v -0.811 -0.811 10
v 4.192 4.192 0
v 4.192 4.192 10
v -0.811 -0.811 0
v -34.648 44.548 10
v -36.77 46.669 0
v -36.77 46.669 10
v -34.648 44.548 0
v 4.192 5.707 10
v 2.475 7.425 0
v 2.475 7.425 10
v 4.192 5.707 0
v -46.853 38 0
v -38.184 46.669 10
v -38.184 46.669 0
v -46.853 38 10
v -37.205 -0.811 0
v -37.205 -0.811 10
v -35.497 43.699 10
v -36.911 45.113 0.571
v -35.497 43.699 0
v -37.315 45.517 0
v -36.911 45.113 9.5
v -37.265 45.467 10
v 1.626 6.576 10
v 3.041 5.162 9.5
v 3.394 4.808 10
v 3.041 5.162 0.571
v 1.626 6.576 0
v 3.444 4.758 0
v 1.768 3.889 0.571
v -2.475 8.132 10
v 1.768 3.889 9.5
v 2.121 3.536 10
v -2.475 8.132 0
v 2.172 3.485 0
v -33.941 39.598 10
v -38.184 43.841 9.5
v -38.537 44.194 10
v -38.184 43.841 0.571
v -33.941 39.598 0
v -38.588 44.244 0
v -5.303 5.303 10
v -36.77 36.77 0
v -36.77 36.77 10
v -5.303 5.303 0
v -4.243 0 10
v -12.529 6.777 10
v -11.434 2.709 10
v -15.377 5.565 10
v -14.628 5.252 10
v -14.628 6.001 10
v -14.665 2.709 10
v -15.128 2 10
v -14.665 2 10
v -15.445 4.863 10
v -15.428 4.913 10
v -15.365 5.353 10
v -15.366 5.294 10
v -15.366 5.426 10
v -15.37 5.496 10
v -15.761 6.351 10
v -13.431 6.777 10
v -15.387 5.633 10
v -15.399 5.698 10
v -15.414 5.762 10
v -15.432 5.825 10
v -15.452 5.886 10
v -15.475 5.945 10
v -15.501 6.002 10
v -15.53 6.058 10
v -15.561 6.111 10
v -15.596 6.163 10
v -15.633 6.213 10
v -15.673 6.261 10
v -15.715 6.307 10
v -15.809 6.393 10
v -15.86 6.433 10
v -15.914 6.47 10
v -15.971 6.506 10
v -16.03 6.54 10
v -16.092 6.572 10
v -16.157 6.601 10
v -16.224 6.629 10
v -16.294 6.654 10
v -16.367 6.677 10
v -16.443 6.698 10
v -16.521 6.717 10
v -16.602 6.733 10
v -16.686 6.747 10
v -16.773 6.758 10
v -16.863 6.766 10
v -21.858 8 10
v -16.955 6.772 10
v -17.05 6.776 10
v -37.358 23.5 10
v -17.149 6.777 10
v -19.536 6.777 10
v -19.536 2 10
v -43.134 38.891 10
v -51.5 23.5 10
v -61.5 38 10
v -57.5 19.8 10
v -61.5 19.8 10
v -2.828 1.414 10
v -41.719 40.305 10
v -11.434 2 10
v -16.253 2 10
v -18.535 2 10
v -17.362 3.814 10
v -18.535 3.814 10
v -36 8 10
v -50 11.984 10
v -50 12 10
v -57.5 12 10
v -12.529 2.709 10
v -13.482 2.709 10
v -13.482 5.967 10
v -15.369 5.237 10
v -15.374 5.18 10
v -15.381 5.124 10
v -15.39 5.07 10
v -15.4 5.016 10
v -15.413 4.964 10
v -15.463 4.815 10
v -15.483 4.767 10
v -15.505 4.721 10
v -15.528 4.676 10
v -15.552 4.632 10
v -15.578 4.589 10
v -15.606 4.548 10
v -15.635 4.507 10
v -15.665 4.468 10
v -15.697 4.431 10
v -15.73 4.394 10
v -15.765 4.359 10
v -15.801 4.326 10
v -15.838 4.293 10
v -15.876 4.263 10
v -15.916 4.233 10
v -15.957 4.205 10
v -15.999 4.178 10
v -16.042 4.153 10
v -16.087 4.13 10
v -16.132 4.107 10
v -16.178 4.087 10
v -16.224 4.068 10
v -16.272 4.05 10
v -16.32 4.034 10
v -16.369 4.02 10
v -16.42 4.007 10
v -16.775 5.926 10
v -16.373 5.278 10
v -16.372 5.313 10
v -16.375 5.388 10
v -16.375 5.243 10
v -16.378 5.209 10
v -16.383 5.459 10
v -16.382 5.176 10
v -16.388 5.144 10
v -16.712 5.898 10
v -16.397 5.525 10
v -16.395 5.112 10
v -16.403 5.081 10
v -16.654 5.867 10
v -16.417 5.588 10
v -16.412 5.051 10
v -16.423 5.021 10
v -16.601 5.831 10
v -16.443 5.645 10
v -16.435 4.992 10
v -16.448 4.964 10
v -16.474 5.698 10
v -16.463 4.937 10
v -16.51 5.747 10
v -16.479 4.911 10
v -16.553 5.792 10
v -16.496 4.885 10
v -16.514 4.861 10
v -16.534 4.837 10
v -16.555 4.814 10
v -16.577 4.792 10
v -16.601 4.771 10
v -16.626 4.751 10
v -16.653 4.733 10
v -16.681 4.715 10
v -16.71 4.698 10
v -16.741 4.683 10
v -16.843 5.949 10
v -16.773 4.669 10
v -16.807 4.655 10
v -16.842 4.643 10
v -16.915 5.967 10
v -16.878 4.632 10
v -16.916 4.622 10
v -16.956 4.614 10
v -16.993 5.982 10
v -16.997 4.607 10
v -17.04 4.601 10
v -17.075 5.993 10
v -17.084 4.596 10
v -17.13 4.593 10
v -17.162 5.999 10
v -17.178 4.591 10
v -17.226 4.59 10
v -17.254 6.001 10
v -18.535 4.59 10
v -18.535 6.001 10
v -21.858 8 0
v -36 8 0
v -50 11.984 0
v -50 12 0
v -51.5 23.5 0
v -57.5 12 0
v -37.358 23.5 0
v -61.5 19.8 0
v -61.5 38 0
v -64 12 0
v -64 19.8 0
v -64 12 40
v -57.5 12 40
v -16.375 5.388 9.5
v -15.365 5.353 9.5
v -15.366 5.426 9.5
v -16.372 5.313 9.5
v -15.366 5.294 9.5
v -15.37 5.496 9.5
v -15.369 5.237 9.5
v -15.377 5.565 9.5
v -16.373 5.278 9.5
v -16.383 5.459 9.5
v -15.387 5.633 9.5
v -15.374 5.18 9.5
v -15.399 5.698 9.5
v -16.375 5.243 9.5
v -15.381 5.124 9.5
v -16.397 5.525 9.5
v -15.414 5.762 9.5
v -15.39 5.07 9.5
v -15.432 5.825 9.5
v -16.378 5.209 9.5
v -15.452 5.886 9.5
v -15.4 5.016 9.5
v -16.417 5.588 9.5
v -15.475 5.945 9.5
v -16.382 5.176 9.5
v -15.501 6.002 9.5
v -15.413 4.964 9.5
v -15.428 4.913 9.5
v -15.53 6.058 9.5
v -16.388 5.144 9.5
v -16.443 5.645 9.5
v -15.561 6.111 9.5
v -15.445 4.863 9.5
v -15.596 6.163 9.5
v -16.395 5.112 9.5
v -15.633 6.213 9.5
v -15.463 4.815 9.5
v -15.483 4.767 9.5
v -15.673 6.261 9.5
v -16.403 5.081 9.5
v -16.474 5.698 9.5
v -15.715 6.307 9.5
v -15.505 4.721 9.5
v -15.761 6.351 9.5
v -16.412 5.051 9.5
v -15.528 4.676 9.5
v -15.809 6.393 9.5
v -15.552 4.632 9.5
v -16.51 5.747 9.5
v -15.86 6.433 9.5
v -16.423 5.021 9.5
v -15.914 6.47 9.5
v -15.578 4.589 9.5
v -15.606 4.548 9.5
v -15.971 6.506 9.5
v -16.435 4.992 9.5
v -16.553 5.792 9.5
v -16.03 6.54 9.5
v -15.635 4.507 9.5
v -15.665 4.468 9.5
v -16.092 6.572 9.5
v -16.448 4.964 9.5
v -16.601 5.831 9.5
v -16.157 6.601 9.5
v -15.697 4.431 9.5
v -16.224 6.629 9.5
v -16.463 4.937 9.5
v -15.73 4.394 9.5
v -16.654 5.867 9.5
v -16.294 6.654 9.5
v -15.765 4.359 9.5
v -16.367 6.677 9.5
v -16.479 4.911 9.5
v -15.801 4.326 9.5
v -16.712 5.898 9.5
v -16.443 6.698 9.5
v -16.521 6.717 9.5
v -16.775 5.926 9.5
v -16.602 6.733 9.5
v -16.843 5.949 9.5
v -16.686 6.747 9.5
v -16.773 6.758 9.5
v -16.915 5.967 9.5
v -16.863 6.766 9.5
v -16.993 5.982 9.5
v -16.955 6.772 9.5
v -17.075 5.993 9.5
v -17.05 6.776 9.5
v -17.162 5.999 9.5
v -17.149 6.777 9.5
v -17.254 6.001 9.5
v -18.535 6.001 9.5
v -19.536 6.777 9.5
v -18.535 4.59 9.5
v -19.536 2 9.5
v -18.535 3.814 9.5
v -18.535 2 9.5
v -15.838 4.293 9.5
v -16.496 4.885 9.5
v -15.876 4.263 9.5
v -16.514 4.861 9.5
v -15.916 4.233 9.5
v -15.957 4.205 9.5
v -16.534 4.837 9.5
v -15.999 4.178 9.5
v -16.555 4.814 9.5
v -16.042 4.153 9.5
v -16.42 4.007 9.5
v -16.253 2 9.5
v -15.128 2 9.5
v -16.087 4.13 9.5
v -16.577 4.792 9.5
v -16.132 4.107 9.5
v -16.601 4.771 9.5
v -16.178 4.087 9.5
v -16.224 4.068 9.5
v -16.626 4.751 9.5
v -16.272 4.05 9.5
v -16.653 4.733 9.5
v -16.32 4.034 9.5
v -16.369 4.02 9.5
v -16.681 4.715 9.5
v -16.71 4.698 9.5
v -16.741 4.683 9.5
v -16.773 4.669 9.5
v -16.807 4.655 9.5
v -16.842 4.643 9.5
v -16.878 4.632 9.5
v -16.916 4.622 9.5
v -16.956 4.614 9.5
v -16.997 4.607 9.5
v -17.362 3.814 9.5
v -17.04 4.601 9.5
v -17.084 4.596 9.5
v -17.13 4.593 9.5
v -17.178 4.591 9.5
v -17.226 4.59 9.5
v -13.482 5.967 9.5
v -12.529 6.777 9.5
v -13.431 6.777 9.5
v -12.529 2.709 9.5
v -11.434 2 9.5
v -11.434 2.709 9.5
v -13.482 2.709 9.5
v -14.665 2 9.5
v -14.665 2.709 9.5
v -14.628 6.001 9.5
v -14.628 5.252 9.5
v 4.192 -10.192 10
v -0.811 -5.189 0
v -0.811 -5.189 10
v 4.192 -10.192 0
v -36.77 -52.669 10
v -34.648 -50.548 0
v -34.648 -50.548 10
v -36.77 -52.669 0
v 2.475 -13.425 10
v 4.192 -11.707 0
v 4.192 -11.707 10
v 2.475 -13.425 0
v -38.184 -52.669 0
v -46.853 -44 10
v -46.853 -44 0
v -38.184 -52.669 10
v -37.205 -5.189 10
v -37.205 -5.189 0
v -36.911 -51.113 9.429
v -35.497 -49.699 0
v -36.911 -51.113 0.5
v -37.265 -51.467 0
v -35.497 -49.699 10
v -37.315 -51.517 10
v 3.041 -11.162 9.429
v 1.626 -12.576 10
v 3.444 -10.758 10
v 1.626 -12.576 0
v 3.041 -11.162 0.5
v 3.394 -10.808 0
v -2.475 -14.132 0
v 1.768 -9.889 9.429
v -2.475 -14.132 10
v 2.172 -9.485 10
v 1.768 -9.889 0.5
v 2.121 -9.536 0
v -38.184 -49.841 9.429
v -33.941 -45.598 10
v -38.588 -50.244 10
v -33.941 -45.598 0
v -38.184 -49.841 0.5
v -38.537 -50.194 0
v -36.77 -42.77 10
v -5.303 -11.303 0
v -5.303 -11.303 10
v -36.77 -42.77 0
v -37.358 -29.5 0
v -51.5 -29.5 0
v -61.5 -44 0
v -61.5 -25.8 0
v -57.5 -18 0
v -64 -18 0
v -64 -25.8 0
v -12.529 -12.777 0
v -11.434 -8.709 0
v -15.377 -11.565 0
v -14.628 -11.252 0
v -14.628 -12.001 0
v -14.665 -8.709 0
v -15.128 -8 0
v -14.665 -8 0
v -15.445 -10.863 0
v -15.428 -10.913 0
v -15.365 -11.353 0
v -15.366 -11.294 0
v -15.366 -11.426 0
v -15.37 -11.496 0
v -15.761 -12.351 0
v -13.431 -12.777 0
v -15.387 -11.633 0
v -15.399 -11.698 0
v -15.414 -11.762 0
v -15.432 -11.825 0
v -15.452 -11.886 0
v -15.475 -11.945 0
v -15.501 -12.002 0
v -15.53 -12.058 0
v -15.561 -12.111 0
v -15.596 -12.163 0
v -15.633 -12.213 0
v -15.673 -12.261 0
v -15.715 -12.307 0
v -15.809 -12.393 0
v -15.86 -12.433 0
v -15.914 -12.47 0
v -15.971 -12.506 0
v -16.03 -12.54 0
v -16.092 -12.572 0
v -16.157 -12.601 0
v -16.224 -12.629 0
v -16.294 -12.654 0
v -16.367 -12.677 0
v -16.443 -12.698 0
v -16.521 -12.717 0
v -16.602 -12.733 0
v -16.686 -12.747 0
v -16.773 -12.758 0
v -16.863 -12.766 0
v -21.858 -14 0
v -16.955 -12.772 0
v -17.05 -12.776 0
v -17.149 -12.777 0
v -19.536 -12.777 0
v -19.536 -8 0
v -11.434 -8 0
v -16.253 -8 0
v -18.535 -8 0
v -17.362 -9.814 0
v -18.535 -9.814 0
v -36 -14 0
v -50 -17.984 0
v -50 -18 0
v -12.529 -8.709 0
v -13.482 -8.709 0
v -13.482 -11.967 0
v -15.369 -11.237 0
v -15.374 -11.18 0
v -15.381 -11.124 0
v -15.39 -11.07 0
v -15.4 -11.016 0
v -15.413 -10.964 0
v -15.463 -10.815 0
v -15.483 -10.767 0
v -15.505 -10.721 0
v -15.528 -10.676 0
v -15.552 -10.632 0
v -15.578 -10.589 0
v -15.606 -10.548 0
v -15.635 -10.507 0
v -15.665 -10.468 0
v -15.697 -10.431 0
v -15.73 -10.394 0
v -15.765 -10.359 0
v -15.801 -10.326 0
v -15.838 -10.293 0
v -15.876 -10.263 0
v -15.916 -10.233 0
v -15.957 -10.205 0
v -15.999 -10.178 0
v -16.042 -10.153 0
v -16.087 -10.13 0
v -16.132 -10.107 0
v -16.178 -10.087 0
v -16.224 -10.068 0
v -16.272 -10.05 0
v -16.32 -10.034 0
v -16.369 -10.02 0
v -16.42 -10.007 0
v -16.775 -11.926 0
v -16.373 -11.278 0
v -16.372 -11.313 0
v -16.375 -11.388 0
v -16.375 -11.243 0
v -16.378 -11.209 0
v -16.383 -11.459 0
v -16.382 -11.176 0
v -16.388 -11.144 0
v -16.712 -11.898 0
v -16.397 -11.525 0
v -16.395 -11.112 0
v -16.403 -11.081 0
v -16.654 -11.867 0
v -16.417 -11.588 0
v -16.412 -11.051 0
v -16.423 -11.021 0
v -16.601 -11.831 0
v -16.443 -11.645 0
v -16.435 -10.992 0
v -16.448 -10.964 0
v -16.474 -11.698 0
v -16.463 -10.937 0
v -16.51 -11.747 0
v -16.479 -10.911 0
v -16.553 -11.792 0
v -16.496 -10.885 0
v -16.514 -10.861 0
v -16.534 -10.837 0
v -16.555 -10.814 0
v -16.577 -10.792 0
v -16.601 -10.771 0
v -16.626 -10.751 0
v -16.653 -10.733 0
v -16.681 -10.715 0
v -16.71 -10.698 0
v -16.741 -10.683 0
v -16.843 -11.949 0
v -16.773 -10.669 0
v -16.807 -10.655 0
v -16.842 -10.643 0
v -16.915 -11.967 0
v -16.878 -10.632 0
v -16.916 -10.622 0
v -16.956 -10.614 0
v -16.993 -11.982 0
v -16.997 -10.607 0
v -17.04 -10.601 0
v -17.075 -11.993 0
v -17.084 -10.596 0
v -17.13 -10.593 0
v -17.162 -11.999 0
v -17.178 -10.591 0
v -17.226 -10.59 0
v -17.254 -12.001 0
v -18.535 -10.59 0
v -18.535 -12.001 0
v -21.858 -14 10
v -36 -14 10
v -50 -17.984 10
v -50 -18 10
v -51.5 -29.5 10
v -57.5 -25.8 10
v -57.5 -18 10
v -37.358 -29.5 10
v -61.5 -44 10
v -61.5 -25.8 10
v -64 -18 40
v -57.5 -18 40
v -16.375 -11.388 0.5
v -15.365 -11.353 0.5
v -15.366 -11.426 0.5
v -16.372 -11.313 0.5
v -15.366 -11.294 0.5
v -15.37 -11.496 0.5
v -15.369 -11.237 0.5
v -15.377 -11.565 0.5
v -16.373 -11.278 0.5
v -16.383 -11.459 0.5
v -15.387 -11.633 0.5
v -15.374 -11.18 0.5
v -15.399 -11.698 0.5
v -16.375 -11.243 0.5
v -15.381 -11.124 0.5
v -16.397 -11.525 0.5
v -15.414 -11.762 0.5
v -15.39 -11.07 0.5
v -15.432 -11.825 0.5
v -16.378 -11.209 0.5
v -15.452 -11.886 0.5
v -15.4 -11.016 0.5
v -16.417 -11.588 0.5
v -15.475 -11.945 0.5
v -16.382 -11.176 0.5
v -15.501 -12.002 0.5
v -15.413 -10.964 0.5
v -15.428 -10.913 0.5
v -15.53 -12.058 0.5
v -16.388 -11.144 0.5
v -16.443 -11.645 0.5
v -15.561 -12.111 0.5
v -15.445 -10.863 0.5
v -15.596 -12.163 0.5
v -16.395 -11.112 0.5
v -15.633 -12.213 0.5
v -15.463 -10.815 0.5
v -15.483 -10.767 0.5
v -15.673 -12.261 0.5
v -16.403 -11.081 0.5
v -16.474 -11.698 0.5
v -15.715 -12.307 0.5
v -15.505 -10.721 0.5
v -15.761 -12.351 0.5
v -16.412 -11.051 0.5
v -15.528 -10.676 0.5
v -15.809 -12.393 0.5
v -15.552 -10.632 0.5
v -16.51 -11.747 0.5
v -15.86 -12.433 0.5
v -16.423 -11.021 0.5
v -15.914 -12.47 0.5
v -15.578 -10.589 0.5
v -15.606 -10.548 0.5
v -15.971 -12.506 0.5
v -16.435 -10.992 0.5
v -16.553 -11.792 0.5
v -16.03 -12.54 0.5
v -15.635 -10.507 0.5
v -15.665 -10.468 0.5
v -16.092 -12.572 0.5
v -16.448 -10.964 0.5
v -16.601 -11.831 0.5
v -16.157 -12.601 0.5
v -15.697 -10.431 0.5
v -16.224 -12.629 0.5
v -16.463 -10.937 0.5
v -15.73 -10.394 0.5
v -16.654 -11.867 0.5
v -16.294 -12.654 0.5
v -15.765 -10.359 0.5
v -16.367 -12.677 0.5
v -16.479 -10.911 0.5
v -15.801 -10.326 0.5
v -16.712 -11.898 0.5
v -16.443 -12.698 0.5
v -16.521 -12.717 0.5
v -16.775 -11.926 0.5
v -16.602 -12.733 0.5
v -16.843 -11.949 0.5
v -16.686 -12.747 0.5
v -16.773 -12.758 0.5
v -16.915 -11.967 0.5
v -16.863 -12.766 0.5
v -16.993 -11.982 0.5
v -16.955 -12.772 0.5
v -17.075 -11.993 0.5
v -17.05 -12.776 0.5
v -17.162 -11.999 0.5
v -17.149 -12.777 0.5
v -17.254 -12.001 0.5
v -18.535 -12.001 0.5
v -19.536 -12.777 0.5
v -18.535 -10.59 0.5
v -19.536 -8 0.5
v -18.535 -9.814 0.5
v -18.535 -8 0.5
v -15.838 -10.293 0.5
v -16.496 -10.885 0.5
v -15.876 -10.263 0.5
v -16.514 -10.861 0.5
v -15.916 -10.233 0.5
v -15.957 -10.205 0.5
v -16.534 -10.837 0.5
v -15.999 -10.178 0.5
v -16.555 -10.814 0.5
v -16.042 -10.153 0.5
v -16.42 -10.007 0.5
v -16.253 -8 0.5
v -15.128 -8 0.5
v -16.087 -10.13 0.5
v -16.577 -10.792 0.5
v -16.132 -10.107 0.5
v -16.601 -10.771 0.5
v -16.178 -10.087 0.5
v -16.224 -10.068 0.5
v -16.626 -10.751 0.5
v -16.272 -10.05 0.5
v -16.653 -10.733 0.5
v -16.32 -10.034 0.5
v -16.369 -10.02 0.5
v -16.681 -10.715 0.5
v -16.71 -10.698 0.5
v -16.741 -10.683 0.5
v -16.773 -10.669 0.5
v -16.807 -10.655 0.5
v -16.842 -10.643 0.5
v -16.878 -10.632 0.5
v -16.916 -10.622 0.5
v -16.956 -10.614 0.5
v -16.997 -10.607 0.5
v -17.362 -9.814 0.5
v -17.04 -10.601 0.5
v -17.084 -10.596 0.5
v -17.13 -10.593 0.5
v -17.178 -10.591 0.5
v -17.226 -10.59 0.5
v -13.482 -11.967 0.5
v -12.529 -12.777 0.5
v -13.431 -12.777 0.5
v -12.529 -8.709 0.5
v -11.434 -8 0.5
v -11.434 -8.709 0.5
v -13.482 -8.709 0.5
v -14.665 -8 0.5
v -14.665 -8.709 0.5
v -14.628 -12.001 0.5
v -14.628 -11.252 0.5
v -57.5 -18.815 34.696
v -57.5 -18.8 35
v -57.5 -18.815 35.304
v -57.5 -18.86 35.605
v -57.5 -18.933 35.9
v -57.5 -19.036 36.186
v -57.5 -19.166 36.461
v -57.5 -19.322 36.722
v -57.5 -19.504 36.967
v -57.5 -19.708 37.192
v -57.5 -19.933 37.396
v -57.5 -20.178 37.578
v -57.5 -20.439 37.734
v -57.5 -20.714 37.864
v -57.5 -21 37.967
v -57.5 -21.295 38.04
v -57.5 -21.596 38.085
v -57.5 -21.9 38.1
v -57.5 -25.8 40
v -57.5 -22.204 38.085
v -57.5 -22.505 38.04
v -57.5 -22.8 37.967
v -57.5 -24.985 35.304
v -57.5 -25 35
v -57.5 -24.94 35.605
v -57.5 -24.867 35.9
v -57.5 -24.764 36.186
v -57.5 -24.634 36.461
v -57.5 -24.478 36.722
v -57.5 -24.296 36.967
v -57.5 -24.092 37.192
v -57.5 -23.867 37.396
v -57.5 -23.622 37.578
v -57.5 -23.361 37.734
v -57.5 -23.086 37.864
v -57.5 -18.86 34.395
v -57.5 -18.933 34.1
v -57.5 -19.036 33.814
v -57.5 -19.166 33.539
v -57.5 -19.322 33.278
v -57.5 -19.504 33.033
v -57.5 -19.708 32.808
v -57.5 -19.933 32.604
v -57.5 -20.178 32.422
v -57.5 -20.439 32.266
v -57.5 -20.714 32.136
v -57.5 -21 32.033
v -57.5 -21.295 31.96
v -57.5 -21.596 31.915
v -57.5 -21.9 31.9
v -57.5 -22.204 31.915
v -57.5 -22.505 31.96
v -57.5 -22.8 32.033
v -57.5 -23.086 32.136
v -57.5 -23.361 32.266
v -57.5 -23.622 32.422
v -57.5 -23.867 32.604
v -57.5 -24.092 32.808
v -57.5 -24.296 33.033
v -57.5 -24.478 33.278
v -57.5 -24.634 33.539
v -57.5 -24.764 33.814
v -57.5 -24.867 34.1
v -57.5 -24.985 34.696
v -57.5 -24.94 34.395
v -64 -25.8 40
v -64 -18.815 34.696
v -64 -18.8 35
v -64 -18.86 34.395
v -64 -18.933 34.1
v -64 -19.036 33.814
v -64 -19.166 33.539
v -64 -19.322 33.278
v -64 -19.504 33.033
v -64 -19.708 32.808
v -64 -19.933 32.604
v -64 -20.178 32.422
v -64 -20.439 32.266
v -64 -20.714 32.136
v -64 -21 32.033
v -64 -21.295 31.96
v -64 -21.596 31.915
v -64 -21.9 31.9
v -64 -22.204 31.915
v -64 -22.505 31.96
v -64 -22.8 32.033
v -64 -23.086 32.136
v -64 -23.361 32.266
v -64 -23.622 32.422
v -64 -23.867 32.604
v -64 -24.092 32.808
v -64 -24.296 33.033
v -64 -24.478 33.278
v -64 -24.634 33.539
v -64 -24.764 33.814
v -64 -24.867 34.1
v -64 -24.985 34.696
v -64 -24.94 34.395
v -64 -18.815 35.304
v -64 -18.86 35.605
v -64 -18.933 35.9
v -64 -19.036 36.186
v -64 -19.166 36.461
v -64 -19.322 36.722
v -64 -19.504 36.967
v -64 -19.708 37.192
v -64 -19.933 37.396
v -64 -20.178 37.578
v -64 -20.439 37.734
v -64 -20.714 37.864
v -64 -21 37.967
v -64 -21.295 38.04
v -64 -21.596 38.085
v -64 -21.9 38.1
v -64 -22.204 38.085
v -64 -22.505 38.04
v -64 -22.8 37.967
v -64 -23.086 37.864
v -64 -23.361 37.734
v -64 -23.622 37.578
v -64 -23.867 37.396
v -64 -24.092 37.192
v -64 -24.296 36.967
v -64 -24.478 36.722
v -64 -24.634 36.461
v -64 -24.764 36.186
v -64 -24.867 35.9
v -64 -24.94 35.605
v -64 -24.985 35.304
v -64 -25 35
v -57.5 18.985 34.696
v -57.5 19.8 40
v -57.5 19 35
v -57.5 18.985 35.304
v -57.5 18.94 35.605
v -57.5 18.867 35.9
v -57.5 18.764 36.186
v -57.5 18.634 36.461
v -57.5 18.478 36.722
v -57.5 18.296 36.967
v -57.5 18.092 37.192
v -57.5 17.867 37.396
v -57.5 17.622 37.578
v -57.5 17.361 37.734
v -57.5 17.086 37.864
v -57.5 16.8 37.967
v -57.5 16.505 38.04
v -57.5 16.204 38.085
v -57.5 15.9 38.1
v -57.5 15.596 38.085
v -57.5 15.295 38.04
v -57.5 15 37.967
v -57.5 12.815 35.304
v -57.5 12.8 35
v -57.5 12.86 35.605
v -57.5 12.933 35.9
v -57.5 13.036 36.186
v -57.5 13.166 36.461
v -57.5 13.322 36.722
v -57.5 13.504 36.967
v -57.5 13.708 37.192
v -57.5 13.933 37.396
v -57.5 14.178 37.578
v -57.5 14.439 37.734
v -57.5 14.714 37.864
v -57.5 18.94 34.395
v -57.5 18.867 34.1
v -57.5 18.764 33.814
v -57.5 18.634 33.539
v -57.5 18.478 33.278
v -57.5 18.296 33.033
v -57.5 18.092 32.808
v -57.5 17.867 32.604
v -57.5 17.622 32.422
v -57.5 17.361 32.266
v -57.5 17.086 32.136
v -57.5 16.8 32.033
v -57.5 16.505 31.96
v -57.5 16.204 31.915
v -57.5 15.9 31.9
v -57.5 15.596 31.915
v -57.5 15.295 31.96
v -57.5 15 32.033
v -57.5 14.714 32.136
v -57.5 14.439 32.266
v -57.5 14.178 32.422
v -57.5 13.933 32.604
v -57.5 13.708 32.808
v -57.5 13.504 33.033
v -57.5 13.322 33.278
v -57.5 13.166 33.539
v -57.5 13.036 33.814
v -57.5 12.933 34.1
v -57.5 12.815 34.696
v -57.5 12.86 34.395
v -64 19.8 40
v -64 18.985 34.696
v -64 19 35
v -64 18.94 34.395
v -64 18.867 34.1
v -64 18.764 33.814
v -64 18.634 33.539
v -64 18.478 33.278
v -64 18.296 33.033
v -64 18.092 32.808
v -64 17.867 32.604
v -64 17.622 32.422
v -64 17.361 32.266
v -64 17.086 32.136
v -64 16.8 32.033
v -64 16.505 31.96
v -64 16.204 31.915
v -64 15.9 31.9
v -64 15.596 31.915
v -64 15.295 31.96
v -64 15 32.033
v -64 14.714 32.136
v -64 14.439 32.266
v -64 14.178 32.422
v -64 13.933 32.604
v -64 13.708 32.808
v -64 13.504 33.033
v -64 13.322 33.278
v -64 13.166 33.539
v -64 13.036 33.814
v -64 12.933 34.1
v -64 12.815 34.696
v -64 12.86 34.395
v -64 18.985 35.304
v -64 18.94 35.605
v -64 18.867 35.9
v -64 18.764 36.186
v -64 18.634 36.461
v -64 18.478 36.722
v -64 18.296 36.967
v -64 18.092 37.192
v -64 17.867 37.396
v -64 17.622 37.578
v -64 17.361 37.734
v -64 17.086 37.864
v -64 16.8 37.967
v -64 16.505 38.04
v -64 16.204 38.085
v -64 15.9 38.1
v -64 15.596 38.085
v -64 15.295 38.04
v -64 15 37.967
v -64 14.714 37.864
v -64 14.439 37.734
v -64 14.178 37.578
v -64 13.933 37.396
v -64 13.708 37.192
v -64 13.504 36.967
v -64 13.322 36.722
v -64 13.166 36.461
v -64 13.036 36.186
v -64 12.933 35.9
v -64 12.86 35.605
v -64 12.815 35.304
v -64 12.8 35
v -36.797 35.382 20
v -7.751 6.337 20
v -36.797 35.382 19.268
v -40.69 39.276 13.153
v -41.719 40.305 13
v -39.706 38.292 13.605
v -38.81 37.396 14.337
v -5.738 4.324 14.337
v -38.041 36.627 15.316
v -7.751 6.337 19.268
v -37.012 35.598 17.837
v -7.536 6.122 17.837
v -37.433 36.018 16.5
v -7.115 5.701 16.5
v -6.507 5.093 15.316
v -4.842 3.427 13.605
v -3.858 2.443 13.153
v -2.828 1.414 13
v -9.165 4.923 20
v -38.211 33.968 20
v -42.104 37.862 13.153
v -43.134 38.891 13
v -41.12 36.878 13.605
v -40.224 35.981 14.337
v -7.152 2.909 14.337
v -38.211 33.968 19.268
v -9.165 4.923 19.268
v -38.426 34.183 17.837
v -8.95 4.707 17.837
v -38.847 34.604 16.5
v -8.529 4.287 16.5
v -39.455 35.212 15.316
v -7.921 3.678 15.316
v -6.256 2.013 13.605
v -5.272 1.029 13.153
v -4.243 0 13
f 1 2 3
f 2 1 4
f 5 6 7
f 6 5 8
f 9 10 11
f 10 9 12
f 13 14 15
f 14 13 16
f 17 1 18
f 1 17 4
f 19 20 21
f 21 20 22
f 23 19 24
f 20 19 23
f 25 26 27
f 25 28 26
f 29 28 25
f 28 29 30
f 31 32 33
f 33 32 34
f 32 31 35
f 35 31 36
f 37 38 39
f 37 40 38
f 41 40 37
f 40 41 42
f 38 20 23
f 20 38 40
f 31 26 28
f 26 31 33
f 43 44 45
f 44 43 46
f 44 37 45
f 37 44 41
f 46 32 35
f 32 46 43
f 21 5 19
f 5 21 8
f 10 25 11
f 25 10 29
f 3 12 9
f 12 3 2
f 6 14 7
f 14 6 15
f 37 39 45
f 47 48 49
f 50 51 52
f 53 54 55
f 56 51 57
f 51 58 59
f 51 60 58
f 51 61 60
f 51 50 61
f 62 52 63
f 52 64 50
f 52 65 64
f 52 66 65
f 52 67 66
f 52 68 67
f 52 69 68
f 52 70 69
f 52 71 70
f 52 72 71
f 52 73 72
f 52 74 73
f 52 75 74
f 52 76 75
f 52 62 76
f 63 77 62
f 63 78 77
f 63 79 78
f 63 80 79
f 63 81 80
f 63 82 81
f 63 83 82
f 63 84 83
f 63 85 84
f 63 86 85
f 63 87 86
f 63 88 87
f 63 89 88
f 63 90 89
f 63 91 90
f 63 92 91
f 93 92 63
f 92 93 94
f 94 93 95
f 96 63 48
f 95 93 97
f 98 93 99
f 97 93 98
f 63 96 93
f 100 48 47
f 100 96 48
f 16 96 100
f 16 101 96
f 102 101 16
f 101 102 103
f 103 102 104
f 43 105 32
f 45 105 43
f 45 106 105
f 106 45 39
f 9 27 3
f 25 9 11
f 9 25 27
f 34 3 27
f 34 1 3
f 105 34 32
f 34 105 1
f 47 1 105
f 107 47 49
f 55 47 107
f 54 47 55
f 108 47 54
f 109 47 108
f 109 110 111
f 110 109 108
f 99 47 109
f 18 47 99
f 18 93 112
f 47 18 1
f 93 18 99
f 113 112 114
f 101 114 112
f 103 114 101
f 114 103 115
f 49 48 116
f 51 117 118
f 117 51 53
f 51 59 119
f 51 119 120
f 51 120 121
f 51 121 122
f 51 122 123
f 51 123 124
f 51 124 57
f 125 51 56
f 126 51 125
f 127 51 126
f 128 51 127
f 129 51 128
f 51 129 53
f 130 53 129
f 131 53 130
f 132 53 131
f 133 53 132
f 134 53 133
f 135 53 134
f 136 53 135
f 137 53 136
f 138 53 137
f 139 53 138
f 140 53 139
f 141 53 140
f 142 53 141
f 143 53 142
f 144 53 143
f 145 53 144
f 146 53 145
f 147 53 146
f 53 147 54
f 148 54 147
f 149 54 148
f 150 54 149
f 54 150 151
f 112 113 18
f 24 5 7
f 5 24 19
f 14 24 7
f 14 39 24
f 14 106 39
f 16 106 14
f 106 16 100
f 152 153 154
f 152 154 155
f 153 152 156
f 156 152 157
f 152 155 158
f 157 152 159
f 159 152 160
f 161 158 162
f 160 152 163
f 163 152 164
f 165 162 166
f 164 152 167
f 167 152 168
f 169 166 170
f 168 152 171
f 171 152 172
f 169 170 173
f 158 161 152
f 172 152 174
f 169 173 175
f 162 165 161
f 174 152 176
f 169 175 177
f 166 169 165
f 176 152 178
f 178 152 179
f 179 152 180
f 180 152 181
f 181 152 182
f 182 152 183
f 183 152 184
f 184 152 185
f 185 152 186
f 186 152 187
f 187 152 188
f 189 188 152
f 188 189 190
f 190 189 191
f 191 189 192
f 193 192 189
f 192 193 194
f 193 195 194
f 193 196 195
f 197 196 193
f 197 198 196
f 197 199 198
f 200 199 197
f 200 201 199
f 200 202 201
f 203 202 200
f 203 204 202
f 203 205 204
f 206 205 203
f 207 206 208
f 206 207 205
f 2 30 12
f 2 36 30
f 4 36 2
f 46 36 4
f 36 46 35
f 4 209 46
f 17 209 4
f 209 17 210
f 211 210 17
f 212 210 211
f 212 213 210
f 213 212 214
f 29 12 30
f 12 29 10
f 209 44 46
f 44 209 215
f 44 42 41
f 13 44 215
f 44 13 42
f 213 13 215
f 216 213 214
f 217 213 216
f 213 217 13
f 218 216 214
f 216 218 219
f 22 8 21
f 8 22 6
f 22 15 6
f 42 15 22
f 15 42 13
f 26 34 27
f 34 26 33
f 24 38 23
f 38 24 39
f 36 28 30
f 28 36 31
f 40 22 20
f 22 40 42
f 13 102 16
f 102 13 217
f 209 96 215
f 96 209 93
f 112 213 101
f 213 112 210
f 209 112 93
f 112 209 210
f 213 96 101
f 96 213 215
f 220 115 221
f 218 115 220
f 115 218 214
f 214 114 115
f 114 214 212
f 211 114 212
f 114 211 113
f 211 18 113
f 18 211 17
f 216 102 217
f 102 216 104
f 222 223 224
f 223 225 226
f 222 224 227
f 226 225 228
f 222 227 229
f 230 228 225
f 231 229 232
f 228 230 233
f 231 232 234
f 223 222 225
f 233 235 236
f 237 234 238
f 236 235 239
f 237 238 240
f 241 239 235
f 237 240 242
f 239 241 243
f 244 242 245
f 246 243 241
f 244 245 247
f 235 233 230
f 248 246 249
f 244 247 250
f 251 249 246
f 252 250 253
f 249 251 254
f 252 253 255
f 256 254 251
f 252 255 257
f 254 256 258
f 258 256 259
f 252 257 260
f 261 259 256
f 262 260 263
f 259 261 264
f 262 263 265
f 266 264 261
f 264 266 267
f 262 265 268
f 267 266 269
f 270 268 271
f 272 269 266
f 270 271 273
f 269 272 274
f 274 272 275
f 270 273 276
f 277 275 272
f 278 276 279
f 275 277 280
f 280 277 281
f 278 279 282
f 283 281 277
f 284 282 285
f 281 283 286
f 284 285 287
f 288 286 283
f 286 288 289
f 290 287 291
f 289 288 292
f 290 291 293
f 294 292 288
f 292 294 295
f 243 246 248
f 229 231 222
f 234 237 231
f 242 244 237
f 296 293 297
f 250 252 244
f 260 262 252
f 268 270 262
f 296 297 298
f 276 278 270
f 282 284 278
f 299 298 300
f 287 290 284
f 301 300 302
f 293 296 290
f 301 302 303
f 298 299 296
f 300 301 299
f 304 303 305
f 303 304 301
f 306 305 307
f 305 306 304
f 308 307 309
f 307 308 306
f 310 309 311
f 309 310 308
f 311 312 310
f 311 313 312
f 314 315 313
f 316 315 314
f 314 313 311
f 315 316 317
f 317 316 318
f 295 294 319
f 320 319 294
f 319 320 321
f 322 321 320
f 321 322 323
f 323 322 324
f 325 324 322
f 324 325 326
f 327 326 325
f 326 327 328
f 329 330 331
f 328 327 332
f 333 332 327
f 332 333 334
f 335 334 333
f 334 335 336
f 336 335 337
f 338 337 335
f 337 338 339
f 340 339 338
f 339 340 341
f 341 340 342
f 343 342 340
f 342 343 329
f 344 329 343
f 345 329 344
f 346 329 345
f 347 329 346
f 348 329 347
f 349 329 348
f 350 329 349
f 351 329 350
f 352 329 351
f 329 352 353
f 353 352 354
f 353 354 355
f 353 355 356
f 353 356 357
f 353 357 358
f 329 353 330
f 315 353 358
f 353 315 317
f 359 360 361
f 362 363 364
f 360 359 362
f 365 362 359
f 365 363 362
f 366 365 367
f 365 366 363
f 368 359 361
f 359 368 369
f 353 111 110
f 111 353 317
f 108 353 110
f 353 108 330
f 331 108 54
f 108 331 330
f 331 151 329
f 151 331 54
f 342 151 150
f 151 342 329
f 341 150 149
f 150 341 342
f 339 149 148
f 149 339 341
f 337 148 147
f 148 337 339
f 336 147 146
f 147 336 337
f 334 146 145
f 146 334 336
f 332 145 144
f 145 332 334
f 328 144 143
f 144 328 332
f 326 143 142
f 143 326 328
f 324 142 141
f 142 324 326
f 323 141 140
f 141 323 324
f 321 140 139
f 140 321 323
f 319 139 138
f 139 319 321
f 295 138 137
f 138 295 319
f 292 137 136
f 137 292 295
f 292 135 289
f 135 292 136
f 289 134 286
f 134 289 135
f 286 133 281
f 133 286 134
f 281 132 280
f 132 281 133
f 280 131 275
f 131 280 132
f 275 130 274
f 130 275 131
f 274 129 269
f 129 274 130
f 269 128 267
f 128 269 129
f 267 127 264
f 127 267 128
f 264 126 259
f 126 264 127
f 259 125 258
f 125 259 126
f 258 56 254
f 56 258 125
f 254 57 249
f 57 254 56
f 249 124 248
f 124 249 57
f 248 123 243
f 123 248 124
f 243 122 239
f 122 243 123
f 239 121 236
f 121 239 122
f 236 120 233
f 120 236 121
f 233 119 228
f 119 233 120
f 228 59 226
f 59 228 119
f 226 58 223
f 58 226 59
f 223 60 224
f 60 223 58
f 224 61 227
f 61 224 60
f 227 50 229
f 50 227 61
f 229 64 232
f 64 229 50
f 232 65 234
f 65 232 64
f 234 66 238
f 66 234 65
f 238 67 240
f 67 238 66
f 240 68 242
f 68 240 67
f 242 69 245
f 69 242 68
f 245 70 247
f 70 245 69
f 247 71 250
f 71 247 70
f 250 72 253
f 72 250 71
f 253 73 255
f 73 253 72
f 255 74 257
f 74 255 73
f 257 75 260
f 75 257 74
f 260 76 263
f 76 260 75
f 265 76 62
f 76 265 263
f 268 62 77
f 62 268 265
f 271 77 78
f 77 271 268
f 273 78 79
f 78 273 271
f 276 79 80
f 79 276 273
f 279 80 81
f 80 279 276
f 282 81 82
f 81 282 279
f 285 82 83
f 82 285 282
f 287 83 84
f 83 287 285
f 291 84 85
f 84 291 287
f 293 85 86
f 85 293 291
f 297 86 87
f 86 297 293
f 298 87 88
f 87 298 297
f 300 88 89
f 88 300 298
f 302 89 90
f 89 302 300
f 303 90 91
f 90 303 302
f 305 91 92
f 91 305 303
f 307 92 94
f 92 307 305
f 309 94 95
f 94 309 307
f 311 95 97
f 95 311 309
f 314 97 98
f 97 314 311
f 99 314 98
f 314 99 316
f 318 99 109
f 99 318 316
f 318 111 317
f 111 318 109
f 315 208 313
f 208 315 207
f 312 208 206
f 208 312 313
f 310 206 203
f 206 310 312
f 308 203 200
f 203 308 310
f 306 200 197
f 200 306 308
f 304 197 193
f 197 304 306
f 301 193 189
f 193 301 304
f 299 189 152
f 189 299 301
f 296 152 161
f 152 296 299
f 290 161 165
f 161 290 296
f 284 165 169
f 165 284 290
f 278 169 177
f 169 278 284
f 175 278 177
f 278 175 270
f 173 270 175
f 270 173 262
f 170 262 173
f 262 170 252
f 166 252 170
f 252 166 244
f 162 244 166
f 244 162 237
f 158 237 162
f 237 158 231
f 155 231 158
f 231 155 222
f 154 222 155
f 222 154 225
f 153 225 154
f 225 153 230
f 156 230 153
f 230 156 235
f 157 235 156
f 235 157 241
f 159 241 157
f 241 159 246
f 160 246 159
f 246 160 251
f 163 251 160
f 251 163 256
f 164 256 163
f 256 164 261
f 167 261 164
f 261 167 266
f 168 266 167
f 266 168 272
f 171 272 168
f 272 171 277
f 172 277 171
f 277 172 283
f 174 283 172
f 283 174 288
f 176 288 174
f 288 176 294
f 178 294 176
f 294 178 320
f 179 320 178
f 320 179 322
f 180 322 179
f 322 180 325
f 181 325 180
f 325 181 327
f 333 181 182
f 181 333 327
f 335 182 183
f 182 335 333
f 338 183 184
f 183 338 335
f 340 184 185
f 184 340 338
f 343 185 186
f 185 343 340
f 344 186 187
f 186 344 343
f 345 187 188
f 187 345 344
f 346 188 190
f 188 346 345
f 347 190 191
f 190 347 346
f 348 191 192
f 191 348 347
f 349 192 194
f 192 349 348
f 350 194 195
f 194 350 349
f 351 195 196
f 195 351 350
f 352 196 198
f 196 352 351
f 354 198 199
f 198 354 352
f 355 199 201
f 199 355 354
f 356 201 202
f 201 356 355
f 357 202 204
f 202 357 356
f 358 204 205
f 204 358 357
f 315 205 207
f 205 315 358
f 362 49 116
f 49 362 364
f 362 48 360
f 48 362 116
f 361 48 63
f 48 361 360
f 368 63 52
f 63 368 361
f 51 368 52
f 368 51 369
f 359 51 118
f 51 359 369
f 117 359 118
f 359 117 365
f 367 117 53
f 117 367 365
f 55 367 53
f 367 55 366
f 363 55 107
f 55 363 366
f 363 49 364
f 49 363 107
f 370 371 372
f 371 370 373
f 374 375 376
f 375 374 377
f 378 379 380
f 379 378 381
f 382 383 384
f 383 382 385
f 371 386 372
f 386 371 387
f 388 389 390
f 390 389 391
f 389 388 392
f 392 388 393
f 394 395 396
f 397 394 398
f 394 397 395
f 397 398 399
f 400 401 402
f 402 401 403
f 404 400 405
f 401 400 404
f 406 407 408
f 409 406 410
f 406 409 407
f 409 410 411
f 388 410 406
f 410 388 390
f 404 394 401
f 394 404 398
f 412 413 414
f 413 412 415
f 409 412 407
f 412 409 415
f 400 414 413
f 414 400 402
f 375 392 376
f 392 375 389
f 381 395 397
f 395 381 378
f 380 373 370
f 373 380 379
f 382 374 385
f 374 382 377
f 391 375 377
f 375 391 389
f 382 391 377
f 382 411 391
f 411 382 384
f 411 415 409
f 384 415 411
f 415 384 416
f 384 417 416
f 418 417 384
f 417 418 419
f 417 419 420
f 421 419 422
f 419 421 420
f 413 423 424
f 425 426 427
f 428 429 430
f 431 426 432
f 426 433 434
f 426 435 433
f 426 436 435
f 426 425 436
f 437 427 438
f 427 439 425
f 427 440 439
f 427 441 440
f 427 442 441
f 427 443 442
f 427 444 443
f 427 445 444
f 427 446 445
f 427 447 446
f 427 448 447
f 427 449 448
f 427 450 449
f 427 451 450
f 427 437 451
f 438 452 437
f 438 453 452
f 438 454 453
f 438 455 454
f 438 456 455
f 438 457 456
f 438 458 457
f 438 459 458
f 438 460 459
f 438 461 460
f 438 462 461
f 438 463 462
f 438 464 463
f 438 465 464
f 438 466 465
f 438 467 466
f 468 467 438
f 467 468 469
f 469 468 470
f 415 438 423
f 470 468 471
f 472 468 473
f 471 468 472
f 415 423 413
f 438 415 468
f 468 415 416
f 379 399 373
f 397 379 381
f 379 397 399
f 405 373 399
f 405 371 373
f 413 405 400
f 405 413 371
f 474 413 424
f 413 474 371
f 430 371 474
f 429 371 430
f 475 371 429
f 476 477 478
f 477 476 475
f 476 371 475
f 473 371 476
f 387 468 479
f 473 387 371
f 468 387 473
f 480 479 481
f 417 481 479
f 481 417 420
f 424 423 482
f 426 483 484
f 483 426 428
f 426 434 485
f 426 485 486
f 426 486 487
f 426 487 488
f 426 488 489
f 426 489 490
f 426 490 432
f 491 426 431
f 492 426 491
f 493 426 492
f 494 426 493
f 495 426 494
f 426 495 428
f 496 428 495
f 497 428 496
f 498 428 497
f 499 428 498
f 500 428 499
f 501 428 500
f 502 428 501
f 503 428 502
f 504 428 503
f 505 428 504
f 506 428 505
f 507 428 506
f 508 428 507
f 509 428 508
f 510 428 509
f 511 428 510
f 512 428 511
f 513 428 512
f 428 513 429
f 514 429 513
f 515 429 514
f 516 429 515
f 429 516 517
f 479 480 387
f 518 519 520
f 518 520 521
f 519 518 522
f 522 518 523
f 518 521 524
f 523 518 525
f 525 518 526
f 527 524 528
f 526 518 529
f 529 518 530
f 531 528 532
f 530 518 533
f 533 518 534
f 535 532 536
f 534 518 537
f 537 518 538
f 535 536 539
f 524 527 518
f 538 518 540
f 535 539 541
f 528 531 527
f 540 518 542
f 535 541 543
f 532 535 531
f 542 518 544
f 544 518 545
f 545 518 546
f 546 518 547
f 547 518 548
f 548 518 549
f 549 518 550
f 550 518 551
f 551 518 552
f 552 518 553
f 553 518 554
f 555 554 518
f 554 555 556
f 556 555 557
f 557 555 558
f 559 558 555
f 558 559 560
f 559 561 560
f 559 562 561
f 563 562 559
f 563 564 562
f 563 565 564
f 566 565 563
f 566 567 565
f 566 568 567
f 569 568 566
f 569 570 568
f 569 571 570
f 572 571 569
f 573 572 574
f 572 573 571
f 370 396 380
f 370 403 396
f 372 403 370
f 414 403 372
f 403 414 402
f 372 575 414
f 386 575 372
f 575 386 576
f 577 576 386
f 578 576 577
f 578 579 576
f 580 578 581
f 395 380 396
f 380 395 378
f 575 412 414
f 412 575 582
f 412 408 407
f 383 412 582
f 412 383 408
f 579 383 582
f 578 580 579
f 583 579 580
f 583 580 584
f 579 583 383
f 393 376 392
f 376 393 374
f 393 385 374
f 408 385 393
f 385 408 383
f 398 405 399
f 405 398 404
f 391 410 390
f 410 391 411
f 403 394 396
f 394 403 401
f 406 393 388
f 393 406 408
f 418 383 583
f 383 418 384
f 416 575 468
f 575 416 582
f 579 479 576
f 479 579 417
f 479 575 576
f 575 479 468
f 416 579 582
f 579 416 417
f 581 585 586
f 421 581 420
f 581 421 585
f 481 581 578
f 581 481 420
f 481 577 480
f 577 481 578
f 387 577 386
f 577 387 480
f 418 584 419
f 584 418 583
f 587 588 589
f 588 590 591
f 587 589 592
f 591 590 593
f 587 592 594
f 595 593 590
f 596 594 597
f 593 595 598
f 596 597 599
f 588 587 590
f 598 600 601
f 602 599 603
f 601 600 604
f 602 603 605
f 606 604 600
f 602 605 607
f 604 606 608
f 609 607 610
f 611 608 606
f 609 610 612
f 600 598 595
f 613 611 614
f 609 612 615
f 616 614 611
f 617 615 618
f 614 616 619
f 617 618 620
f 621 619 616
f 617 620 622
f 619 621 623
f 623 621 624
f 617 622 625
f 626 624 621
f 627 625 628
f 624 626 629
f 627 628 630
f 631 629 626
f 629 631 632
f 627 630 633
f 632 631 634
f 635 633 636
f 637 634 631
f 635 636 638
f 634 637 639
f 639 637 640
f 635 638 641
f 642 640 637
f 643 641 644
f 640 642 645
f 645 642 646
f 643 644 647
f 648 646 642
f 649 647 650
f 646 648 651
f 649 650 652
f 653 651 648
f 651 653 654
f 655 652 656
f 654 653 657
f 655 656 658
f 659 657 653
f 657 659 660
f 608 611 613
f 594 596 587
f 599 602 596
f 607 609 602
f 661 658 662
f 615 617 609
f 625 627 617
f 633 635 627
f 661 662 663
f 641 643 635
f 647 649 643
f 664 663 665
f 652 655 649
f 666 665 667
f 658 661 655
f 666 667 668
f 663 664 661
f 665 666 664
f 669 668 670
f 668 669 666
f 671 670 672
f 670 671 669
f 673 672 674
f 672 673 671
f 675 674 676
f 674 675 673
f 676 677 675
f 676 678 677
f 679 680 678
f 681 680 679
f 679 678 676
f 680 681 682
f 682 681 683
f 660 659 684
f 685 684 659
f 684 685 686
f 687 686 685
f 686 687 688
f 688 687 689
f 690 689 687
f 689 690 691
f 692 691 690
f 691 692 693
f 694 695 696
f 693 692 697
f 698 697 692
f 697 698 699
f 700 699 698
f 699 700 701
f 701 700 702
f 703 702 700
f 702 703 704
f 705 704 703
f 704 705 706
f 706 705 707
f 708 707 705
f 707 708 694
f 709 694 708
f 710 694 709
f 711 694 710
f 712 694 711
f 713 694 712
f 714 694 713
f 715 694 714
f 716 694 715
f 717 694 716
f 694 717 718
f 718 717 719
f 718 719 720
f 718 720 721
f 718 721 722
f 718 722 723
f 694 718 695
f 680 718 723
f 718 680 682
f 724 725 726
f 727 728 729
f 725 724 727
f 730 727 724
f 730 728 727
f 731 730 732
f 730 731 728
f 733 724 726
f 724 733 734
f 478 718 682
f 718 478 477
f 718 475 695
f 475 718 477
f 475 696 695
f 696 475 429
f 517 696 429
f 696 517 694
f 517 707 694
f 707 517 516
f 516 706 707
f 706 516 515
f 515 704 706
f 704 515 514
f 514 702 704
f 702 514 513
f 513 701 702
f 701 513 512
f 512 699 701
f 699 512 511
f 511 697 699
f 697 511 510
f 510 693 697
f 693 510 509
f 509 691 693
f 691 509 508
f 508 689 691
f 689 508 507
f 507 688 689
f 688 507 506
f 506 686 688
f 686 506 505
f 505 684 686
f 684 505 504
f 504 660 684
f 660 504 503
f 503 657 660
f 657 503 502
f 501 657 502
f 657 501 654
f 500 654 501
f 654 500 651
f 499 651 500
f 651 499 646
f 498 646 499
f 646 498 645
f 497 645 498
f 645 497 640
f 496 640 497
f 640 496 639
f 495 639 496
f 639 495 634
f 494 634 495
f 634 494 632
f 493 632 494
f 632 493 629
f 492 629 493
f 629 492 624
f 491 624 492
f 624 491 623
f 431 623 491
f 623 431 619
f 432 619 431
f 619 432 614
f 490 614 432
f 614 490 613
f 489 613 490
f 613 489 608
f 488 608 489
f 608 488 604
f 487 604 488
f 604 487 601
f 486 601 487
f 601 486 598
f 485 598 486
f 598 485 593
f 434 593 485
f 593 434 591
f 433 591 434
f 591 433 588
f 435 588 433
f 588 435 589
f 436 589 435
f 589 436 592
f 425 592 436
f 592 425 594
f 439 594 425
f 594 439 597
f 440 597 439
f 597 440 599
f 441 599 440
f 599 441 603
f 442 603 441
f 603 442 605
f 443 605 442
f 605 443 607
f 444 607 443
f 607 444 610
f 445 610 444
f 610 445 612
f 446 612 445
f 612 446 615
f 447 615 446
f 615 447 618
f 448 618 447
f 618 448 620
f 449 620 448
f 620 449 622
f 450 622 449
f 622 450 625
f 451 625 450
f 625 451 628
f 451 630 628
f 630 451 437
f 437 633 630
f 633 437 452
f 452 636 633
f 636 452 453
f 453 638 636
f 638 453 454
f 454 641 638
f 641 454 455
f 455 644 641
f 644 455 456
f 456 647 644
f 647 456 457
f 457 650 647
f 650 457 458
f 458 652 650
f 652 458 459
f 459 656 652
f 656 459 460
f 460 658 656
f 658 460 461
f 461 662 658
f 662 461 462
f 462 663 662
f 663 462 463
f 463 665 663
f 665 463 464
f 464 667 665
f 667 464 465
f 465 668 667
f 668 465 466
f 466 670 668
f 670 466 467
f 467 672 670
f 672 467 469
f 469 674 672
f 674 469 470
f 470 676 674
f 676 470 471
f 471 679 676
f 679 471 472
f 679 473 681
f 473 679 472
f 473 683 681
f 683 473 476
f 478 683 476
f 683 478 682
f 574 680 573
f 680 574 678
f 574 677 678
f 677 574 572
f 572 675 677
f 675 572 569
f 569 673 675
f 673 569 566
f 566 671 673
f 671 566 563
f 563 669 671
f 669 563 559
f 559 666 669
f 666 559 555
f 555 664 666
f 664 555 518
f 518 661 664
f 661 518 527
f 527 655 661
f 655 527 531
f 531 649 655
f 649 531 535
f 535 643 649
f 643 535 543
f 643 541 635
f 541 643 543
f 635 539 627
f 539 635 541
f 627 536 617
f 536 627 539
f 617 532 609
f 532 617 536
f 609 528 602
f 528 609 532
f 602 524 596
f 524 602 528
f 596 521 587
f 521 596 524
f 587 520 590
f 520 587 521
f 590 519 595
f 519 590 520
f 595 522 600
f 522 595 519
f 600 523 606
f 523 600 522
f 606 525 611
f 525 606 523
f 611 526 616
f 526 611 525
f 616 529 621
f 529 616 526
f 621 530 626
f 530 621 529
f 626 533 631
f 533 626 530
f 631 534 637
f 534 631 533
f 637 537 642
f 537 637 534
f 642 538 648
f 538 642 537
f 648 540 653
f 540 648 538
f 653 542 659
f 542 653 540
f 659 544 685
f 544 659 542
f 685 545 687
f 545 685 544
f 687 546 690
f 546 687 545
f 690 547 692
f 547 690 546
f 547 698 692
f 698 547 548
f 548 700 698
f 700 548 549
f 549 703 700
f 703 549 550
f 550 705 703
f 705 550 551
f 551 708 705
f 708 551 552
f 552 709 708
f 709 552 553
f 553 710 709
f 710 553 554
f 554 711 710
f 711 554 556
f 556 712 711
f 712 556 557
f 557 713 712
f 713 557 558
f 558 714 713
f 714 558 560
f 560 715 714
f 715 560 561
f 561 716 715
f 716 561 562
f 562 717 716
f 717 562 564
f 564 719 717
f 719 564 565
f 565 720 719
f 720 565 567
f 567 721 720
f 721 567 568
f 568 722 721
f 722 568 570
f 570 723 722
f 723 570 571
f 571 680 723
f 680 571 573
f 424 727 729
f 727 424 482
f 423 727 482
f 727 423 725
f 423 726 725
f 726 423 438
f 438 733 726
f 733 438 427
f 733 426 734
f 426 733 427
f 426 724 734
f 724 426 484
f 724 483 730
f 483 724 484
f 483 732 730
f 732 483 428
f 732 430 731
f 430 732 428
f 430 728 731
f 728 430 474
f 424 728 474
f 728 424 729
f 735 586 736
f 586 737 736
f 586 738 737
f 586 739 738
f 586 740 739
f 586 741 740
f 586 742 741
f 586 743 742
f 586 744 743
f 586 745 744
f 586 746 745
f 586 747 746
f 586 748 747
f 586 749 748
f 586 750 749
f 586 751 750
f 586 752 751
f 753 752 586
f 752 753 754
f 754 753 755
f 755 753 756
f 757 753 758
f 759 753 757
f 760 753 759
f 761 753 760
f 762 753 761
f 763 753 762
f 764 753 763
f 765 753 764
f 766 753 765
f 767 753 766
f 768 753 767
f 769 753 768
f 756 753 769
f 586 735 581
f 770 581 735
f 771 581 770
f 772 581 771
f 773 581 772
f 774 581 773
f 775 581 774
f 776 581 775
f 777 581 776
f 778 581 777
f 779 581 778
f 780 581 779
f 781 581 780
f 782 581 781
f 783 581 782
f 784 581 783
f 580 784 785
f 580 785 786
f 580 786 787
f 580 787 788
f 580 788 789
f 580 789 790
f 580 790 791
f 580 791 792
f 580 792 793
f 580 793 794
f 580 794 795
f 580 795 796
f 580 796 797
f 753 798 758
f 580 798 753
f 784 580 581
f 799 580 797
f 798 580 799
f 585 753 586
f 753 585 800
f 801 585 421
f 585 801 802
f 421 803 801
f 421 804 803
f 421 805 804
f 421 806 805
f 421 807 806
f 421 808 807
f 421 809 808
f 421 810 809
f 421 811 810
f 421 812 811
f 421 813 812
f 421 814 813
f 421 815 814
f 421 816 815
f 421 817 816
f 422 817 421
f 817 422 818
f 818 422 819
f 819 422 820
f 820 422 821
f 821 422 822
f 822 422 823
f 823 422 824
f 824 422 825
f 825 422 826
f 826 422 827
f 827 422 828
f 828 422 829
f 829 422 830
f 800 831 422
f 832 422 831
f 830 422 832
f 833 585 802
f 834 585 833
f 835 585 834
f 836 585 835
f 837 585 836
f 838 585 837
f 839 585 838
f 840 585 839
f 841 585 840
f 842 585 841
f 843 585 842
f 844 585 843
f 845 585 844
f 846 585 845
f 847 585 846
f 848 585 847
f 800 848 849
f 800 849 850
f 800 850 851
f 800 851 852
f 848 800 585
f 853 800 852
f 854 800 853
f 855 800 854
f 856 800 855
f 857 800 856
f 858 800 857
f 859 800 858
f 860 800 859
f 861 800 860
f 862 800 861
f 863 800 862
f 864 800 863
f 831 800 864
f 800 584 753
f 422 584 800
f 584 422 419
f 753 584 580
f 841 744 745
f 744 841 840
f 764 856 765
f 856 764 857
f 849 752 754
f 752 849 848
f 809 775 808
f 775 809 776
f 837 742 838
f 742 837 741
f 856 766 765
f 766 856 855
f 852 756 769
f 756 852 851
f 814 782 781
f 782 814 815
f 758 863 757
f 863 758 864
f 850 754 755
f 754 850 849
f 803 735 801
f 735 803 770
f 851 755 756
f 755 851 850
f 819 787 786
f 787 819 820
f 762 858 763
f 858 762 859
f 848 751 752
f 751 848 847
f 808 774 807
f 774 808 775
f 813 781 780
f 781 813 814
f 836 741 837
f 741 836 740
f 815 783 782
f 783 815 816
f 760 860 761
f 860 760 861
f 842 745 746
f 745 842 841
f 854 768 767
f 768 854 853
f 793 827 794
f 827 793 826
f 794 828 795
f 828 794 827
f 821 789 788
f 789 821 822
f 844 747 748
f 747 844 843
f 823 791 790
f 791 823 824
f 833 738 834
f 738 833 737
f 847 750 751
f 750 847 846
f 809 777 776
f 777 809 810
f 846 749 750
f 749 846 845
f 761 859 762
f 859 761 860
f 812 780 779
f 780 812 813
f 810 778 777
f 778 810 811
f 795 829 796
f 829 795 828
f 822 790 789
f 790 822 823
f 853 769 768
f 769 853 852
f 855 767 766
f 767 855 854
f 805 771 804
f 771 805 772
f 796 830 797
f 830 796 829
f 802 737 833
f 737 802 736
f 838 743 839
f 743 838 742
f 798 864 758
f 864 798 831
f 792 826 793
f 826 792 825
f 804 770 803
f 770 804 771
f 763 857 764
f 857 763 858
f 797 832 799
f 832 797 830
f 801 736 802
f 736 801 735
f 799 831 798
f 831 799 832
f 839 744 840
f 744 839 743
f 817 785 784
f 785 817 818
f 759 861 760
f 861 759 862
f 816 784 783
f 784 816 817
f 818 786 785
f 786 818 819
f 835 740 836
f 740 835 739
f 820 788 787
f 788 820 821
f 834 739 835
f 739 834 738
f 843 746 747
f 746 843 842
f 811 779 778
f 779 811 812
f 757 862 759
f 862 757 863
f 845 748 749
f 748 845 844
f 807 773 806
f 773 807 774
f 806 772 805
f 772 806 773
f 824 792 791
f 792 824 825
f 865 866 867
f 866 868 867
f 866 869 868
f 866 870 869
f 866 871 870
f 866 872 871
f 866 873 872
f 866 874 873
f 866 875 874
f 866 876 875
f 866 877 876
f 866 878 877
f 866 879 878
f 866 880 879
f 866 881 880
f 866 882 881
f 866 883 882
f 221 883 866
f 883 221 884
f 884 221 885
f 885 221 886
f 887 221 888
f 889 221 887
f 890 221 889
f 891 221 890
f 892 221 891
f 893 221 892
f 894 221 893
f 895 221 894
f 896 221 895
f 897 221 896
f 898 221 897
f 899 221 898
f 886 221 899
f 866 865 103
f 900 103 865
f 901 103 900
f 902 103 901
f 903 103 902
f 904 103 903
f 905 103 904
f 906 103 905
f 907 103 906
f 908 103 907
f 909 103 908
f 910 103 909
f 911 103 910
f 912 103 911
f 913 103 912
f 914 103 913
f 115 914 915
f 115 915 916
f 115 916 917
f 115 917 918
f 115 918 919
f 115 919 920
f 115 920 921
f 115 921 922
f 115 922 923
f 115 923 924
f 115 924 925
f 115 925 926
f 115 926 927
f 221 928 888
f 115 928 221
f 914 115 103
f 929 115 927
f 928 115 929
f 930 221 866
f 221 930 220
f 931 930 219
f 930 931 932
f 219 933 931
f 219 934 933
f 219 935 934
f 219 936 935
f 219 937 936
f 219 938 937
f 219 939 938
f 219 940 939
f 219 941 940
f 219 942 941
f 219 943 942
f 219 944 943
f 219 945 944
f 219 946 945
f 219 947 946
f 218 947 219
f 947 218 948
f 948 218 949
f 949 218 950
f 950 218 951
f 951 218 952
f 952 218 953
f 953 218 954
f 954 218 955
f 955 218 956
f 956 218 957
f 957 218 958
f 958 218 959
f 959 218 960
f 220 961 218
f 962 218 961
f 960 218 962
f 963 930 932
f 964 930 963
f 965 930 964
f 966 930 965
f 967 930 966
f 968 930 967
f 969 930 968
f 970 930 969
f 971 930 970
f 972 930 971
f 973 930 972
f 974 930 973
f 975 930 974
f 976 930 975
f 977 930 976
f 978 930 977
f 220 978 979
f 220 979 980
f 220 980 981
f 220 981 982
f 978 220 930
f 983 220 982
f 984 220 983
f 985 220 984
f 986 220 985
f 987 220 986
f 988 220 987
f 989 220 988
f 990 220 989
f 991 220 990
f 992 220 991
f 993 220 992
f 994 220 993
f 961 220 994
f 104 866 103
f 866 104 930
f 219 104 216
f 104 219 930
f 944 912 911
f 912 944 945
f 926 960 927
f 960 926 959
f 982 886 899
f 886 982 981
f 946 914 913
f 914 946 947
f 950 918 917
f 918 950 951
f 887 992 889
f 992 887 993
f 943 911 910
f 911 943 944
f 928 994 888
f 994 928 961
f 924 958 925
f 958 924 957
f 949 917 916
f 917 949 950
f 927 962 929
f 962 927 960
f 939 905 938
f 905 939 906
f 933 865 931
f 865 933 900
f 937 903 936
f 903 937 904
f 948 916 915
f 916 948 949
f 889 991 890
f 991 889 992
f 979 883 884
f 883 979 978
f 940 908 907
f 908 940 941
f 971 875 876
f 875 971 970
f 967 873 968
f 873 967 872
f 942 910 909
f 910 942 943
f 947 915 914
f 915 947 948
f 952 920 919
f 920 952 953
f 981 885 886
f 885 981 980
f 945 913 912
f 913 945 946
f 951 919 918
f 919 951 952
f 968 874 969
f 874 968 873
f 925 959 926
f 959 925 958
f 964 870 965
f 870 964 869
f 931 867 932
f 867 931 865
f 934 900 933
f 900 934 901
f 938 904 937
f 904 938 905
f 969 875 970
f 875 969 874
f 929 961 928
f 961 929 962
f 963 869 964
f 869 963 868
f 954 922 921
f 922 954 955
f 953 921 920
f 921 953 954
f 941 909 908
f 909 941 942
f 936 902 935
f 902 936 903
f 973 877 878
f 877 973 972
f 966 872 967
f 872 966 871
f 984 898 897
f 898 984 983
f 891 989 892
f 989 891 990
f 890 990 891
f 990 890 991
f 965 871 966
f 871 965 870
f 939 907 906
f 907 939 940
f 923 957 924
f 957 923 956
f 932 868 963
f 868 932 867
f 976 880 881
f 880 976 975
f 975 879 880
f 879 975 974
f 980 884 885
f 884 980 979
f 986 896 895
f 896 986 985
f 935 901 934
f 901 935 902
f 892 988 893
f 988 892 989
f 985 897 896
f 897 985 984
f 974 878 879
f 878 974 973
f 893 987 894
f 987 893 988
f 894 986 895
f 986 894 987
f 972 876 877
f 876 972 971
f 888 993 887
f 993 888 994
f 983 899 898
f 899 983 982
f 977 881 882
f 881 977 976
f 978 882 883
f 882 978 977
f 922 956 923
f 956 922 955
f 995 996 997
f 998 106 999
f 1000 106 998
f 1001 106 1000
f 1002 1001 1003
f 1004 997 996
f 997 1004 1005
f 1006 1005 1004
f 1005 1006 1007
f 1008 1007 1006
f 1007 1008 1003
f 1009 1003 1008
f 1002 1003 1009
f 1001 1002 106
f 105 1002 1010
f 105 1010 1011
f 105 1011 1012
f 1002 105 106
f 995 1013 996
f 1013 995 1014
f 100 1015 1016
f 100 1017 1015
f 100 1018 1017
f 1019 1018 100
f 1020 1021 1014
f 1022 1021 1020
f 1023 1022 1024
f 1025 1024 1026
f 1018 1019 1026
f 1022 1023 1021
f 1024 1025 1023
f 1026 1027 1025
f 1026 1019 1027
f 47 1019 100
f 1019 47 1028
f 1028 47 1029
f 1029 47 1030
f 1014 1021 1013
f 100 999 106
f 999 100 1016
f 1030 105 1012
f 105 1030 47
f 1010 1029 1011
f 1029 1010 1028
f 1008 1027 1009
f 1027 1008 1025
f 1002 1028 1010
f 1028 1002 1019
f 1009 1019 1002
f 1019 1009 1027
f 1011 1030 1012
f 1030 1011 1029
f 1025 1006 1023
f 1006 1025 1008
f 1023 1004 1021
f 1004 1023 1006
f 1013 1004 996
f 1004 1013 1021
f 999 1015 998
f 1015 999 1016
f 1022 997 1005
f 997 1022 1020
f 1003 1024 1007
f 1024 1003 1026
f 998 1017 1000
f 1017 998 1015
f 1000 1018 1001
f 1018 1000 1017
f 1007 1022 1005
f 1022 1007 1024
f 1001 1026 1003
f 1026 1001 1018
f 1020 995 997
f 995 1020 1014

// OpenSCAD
// PRUSA iteration4
// lcd supports
// GNU GPL v3
// Josef Průša <iam@josefprusa.cz> and contributors
// http://www.reprap.org/wiki/Prusa_Mendel
// http://prusamendel.org

// Modified to fit 4040 profile


$fn=64;

module body()
{

    difference() 
        {
        // base block
        translate([-55,-2,0]) cube([69,81,10]); 

            union ()
            {
                // outer body shape
                translate([-69.6,32,-1]) rotate([0,0,45]) cube([60,53,15]); 
                translate([13.7,89.7,-1]) rotate([0,0,135]) cube([60,42,15]);
                translate([-19,-9,-1]) cube([60,9,15] );   
                translate([7,-3,-1]) cube([60,68,16]);  
                translate([-16,60,-1]) cube([60,50,15] );
                translate([-41, -45,-1]) rotate([0,0,45]) cube([60,80,13]);  
                
                // pcb cout out
                translate([4,1.5,-1]) cube([1.8,56.5,17]); 
                translate([0,7.5,-1]) cube([5.8,44.5,17]); 
                translate([4.8,3.5,-1]) cube([5.8,52.5,17]);
                translate([8,-5,-1] ) rotate([0,0,45]) cube([5,5,17]);
                translate([8,58,-1]) rotate([0,0,45]) cube([5,5,17]);
            }

            // pcb inserts
            translate([4,3,8]) rotate([45,0,0]) cube([1.8,5,5]); 
            translate([4,56.5,8]) rotate([45,0,0]) cube([1.8,5,5]);     
            translate([4,3,-5]) rotate([45,0,0]) cube([1.8,5,5]); 
            translate([4,56.5,-5]) rotate([45,0,0]) cube([1.8,5,5]);     
        }
}



module support()
{
    difference() 
    {
    
        union()
        {
            rotate([0,0,45]) body();
            // screw block
            translate([-72,22,0])  cube([30,16,10]);    
         
        }
        
        // lower angled part cut
        translate([-75,-2,-1])  cube([20,14,15]);    
        translate([-70,-2,-1]) cube([20,14,15]);    
        translate([-50,-16.3,-1]) rotate([0,0,45]) cube([20,20,15]);    
        
        translate([-76.5,-2,-1]) cube([15,40,15]);    
        
        difference()
        {
            translate([-28,0,-1]) rotate([0,0,45]) cube([10,40,15]);    
            translate([-38,-12,-1]) cube([20,20,15]);    
            translate([-58,23.5,-1]) cube([25,25,15]);    
        }
        
        // screw holes
        //translate([-71,18+4,5]) rotate([0,90,0]) cylinder(h=22, r=1.75, $fn=30);  
        //translate([-70,29+4,5]) rotate([0,90,0]) cylinder(h=22, r=1.75, $fn=30);  
        
        // nut traps
        //translate([-58,15.1+4,5-2.8]) cube([2.2,5.8,29.7]);    
        //translate([-58,26.1+4,5-2.8]) cube([2.2,5.8,29.7]); 
     
       
        // version
        translate([-20,2,9.5]) rotate([0,0,0]) linear_extrude(height = 0.6) 
        { text("R1",font = "helvetica:style=Bold", size=5, center=true); }   
    }
}


module left_lcd_support()
{
    union(){
        support();
        translate([-64,12,0]) 
        difference(){
        cube([6.5,7.8,40]);
            translate([0,3.9,35]) 
            rotate([0,90,0]) 
            cylinder(h=20, d=6.2, center=true);
            }
        }
    rotate([0,0,45]) difference()
    {
        // sd card shield
        translate([-3,3,10])  cube([2,55,10]); 
        translate([-4,3,20]) rotate([0,90,0]) cylinder( h=4, r=7, $fn=30); 
        translate([-4,58,20]) rotate([0,90,0]) cylinder( h=4, r=7, $fn=30); 
    }
}

module right_lcd_support()
{
    translate([0,-6,10]) rotate([0,180,180]) 
    union(){
        support();
        translate([-64,12,-30]) 
        difference(){
        cube([6.5,7.8,40]);
            translate([0,3.9,5]) 
            rotate([0,90,0]) 
            cylinder(h=20, d=6.2, center=true);
            }
    }
    
}

right_lcd_support();
left_lcd_support();

 
